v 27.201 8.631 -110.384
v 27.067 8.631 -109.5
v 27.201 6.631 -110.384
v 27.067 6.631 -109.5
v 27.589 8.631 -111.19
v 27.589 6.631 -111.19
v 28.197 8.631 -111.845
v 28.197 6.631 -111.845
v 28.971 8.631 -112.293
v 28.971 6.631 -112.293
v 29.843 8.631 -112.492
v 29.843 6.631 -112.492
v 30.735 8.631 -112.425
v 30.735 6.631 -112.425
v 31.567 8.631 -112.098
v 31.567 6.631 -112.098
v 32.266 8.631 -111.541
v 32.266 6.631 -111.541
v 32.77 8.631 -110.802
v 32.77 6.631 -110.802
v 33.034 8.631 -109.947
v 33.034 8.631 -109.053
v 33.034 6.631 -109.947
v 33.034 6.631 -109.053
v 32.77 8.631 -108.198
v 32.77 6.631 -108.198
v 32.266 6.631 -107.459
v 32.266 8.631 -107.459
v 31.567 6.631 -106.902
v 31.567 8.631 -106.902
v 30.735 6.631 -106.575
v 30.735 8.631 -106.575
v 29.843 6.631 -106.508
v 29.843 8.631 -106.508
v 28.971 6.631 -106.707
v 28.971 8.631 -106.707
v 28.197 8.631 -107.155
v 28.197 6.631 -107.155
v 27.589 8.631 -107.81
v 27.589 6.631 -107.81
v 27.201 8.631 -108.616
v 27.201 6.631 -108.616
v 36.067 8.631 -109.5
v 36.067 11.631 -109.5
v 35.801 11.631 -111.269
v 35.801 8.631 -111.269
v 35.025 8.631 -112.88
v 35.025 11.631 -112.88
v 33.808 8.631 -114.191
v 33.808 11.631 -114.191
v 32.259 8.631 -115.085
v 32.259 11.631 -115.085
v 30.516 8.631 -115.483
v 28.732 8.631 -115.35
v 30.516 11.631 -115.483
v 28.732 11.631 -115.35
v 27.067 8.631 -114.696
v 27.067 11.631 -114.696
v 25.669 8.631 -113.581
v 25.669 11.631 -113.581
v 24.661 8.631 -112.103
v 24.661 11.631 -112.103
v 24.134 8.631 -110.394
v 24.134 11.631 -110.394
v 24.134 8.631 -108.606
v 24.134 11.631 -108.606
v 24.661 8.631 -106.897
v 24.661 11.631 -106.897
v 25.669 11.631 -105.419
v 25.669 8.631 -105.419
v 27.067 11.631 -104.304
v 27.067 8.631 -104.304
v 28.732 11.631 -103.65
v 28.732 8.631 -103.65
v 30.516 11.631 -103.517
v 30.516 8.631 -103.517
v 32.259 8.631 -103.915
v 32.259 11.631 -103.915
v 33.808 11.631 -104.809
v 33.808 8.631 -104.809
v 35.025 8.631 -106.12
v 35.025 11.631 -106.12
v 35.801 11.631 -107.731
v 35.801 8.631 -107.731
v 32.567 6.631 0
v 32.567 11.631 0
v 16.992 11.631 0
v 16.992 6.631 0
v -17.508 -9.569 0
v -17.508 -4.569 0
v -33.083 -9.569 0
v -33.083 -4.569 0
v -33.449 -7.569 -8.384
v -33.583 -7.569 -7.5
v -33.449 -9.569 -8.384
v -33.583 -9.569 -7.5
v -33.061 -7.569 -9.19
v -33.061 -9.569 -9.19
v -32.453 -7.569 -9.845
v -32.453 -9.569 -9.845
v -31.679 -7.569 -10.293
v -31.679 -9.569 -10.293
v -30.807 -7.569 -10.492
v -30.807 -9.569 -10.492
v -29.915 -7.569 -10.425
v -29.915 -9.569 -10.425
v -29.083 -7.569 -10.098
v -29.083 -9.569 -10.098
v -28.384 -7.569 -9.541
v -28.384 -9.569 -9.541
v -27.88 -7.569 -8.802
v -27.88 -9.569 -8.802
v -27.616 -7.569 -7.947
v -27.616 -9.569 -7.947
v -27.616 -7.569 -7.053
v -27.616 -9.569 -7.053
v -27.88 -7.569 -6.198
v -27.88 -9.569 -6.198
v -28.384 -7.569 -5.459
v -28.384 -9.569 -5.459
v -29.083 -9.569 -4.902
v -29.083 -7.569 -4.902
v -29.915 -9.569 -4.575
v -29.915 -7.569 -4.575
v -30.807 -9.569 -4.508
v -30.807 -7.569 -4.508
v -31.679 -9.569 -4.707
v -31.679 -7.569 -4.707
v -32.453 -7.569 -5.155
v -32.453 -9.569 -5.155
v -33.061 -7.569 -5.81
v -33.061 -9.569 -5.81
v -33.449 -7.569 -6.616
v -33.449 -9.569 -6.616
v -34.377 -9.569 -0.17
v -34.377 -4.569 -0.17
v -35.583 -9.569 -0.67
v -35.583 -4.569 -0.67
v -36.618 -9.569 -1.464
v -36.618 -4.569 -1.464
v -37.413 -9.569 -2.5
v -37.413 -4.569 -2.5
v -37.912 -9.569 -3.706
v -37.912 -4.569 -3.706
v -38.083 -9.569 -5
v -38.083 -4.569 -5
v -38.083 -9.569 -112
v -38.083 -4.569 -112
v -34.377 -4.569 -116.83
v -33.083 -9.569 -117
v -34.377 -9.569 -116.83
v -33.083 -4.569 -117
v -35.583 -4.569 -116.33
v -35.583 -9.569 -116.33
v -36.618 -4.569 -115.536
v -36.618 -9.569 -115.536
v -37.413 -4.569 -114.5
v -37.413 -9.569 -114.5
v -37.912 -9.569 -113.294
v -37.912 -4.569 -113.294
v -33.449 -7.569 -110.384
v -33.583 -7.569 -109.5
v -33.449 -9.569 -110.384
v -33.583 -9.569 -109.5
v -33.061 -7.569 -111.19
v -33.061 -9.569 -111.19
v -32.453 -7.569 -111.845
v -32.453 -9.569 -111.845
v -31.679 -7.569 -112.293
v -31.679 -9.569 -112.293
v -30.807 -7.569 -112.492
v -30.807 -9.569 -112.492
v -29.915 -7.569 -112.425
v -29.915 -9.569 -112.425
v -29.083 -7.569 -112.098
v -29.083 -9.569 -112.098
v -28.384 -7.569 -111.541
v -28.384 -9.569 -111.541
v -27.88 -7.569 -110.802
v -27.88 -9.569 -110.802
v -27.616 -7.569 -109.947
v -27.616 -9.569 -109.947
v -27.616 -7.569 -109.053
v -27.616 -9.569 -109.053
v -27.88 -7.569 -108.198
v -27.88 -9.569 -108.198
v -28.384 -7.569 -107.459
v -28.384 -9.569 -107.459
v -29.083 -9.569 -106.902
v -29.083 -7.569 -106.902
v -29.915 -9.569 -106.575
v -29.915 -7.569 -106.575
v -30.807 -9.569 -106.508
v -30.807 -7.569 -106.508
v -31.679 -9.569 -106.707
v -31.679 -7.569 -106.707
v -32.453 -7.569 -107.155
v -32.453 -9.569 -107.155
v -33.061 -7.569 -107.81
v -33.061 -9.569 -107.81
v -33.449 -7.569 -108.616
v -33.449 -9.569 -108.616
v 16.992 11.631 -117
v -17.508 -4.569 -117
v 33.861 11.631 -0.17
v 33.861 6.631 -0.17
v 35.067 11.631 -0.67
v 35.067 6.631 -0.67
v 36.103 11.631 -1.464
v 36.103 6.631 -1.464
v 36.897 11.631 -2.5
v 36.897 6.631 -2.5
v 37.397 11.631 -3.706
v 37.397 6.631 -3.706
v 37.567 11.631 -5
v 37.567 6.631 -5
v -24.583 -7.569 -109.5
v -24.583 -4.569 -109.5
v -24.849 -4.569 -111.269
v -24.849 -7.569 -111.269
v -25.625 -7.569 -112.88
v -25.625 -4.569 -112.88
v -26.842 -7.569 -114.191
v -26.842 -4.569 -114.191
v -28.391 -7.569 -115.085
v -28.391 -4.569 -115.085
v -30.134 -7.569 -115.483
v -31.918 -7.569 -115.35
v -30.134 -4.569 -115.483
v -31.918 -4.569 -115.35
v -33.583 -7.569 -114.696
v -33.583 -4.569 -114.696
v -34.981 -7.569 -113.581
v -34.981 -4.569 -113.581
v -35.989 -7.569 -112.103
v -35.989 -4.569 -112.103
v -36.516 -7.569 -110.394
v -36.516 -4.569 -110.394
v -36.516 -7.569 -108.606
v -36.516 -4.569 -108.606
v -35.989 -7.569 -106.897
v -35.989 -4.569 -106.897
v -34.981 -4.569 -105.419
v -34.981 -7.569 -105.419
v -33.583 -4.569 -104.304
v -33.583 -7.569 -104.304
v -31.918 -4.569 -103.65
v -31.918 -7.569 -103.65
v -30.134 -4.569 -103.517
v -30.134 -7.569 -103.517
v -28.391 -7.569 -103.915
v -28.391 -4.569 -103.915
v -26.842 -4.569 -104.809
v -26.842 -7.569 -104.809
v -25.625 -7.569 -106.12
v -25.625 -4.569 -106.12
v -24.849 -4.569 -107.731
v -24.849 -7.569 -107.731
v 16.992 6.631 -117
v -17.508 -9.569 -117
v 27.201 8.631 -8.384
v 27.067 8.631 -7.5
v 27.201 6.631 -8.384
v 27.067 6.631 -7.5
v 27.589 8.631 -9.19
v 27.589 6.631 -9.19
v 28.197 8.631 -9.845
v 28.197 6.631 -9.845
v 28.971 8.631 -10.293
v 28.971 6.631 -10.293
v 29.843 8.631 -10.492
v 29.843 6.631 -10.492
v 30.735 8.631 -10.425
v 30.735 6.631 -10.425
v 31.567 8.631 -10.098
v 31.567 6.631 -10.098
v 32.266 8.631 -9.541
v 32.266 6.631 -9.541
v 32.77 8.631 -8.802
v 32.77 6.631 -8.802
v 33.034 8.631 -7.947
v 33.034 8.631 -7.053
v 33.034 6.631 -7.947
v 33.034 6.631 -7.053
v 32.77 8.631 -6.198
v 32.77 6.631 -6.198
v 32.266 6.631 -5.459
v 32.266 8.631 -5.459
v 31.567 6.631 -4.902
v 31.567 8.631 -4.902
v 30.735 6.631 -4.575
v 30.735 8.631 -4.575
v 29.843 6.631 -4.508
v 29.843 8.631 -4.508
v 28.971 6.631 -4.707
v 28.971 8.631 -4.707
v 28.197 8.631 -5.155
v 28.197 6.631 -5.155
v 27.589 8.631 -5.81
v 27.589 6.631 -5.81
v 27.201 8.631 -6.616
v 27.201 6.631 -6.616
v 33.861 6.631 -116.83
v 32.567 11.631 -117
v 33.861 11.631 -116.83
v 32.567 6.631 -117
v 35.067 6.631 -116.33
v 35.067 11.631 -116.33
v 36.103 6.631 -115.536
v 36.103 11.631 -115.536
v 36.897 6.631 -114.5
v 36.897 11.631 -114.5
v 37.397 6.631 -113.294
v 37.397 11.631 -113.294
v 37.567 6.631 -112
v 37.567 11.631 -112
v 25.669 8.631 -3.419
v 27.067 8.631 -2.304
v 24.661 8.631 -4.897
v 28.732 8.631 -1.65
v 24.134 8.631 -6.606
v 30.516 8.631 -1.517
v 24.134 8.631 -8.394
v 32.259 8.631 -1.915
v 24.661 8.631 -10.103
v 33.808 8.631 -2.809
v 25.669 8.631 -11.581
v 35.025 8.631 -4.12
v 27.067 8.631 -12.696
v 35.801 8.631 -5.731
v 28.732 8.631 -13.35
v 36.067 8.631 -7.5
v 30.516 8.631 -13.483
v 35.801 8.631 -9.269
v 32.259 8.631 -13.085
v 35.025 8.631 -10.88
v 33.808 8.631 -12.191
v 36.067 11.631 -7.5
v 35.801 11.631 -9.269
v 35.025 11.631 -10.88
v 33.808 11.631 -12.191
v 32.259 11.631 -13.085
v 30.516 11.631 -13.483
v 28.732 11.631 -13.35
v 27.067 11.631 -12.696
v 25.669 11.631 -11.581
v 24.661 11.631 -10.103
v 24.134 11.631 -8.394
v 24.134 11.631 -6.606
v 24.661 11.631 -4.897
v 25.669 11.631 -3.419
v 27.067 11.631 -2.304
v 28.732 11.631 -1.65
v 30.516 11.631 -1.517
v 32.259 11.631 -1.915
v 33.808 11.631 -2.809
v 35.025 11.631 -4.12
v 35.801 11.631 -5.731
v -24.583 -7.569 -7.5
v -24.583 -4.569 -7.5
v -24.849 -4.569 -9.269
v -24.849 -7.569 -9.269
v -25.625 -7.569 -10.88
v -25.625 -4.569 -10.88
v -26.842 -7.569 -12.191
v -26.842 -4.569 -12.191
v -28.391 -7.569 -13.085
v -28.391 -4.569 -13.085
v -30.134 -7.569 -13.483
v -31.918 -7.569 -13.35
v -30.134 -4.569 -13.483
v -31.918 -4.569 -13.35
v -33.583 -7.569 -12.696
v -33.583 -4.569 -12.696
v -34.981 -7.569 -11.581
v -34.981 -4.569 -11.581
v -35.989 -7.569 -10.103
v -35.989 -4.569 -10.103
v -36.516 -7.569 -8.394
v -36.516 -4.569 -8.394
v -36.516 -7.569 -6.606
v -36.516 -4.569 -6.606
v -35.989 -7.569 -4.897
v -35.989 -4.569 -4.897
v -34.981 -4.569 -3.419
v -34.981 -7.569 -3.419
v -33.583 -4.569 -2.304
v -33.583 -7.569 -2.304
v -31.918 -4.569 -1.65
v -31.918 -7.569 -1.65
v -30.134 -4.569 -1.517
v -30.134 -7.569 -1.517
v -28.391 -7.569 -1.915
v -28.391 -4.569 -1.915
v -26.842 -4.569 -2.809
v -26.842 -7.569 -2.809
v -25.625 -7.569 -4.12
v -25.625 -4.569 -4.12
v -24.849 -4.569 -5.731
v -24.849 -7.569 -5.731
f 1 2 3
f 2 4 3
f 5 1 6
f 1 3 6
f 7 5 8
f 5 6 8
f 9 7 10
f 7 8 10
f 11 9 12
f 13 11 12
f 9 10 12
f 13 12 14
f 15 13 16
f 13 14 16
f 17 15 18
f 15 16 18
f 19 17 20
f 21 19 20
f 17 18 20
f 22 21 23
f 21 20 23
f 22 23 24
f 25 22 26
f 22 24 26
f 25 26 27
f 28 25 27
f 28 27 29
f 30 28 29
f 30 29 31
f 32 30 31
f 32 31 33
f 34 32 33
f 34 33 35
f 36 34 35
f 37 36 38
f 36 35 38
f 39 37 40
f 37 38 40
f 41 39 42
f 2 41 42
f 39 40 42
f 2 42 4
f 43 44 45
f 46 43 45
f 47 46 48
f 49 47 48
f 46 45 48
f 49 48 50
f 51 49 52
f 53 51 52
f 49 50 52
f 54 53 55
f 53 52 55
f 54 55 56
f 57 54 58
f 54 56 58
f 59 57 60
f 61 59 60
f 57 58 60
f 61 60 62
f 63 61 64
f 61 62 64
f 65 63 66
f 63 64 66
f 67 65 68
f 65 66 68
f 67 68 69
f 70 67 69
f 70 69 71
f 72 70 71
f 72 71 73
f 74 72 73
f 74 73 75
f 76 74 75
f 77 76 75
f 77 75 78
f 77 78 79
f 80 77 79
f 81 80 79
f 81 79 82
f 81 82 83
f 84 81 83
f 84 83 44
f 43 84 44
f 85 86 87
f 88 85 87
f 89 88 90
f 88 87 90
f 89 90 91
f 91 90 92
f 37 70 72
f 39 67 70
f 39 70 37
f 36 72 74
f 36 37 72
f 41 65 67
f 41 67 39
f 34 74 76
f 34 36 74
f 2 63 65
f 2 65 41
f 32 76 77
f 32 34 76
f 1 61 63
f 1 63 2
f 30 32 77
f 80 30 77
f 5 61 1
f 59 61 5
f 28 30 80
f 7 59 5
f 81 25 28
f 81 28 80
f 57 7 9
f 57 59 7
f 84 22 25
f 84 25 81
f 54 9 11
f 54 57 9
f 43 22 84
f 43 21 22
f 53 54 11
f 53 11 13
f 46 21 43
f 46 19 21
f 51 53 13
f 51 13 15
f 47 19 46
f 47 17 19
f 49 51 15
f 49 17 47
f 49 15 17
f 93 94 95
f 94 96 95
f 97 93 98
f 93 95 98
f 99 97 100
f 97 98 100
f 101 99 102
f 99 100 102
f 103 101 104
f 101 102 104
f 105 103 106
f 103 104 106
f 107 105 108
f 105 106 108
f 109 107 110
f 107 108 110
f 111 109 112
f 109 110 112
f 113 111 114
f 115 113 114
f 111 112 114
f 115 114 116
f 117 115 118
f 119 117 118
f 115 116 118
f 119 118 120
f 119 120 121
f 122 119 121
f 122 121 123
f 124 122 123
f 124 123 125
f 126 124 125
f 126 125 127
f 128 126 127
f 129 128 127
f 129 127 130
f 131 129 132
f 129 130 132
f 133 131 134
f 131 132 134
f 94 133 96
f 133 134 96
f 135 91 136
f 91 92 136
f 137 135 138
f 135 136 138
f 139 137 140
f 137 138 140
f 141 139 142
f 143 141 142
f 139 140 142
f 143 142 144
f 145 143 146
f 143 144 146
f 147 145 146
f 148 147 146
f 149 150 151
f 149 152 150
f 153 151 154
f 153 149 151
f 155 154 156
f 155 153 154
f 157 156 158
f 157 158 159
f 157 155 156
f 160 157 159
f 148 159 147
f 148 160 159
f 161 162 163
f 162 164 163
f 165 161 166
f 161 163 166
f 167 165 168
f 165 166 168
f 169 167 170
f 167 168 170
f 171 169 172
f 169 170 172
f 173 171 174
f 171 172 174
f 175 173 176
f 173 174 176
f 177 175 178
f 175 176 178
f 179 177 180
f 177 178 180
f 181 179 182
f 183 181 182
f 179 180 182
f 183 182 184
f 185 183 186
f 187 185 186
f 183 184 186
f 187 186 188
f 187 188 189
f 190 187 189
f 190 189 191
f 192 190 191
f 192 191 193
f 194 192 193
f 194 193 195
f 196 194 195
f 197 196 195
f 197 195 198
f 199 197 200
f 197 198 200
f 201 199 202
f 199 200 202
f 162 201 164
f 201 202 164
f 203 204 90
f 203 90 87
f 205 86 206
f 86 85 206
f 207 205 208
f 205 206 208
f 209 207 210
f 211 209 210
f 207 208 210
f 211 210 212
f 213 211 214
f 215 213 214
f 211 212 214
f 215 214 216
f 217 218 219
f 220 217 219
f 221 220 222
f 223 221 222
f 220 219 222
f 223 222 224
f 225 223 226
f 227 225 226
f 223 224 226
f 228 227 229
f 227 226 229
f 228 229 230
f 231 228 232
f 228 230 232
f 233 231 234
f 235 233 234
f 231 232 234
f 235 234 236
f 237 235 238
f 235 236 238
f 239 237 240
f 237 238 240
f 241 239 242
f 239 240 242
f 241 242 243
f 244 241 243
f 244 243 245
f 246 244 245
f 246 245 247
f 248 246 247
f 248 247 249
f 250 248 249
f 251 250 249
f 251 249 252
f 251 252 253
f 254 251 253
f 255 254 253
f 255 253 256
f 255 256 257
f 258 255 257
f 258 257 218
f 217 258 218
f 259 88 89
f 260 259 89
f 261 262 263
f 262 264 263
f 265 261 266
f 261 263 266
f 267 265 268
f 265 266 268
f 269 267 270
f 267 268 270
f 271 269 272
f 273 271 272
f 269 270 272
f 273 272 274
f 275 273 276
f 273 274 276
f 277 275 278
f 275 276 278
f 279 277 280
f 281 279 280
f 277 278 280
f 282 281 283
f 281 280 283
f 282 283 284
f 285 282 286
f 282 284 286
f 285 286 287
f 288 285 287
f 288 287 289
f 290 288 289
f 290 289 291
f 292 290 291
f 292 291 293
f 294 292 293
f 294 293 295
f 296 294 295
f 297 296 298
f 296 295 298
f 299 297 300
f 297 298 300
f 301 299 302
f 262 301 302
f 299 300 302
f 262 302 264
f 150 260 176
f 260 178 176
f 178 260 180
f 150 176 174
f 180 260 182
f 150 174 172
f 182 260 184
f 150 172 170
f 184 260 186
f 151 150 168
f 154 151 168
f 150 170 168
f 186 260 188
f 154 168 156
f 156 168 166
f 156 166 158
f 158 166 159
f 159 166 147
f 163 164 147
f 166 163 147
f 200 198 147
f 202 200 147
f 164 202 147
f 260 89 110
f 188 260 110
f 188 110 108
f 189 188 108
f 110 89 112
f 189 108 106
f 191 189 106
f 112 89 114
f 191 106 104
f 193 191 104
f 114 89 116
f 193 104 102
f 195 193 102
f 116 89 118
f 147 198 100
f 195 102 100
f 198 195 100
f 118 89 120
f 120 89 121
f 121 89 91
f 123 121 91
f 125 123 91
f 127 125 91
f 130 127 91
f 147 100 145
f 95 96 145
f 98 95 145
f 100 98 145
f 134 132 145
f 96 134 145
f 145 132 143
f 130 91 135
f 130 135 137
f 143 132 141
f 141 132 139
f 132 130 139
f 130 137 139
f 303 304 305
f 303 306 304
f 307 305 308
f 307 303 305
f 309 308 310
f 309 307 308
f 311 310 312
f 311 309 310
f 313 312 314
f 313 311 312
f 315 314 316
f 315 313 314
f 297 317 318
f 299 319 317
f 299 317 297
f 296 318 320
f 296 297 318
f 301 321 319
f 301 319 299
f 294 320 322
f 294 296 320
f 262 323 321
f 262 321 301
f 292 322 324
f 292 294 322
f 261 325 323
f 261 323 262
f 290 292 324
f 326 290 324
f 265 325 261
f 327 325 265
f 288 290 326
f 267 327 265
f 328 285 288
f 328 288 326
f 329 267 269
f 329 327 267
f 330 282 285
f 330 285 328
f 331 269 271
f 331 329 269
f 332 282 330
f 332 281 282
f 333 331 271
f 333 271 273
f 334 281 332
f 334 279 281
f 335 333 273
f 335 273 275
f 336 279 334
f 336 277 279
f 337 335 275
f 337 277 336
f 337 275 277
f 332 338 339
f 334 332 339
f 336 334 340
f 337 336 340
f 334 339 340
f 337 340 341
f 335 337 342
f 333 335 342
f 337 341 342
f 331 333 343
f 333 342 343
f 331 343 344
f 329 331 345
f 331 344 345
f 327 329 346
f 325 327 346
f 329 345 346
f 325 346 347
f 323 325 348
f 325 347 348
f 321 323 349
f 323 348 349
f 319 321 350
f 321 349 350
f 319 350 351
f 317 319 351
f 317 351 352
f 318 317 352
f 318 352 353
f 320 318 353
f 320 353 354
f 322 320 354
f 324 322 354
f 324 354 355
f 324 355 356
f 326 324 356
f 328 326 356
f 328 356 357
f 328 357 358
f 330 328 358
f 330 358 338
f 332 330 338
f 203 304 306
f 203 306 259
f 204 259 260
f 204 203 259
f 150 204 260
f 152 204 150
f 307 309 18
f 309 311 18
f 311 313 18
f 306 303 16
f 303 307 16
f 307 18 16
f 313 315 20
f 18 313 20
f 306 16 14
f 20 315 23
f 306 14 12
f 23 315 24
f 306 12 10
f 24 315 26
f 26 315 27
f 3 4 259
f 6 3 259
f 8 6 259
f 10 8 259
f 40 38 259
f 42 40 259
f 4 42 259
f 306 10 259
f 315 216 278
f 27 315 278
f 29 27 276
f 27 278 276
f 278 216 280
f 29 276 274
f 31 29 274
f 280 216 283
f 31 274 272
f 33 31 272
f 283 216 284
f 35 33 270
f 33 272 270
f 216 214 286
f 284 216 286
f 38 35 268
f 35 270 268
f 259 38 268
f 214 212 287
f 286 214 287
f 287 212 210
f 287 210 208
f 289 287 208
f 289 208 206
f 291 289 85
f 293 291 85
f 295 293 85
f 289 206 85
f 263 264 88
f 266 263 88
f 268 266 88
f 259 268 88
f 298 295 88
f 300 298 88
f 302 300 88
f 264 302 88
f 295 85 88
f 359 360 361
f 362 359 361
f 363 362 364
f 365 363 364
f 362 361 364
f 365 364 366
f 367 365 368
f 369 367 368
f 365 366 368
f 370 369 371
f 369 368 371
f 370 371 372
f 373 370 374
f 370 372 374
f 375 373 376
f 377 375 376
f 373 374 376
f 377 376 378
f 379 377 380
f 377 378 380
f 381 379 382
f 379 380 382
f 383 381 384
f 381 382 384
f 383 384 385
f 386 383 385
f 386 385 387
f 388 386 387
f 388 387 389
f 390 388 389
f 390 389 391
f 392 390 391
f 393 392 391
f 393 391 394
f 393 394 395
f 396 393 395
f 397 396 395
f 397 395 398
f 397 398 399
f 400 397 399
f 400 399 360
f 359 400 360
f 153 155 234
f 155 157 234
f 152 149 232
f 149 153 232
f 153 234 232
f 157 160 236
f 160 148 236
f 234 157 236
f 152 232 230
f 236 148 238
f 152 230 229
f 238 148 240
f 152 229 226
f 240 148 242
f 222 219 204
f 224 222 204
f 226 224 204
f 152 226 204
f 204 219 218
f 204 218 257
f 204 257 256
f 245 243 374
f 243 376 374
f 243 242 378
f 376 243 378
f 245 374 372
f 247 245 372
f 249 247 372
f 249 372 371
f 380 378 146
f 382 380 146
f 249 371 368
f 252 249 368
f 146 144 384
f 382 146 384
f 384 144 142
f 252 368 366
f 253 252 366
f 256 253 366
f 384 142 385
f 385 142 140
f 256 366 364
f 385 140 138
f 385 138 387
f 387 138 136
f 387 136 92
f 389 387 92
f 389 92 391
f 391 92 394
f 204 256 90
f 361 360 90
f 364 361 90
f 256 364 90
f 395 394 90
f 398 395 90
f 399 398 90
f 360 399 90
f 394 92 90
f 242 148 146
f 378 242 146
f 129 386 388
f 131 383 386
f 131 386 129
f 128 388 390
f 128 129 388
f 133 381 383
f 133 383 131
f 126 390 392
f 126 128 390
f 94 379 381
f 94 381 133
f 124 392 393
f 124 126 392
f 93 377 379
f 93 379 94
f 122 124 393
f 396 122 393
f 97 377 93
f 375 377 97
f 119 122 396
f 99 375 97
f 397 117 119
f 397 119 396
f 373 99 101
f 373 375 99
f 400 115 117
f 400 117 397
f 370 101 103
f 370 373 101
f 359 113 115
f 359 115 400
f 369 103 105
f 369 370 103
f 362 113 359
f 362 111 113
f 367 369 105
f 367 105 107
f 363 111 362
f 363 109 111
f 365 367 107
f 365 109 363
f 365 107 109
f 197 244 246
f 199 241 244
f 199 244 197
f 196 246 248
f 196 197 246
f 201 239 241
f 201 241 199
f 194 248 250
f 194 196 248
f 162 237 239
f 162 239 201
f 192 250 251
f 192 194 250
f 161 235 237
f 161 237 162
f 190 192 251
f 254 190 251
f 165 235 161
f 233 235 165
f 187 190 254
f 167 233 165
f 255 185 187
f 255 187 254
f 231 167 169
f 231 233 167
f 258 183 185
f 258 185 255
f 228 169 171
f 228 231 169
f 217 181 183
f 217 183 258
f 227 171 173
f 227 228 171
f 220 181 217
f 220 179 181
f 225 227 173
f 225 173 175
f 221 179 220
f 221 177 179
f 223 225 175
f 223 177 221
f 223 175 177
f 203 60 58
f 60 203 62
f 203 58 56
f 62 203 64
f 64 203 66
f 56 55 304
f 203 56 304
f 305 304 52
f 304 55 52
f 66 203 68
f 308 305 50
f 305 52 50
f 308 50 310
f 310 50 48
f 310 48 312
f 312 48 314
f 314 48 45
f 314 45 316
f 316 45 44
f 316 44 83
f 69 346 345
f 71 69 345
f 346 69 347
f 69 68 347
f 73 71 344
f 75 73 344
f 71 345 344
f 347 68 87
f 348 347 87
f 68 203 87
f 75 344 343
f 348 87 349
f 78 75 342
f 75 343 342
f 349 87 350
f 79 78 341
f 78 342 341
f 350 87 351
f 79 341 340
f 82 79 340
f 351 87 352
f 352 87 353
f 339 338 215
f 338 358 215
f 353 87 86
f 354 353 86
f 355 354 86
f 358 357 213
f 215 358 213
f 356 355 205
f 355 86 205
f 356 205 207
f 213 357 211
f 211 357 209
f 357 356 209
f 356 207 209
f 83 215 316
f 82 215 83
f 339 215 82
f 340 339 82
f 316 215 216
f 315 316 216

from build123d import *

# Parameters (mm, degrees)
COVER_BODY_DEPTH                        = 117
CBORE_FOR_M6_HEX_HEAD_BOLT1_D           = 6
CBORE_FOR_M6_HEX_HEAD_BOLT1_CBORE_D     = 12
CBORE_FOR_M6_HEX_HEAD_BOLT1_CBORE_DEPTH = 3
CBORE_FOR_M6_HEX_HEAD_BOLT2_D           = 6
CBORE_FOR_M6_HEX_HEAD_BOLT2_CBORE_D     = 12
CBORE_FOR_M6_HEX_HEAD_BOLT2_CBORE_DEPTH = 3
FILLET1_R                               = 5


with BuildPart() as part:
    # Sketch1 → Cover Body (new body)
    with BuildSketch(Plane.XY):
        Polygon((-17.507754177, -4.568983292), (16.992245823, 11.631016708), (37.567245823, 11.631016708), (37.567245823, 6.631016708), (16.992245823, 6.631016708), (-17.507754177, -9.568983292), (-38.082754177, -9.568983292), (-38.082754177, -4.568983292), align=None)
    extrude(amount=-COVER_BODY_DEPTH)

    # CBORE for M6 Hex Head Bolt1 (through all)
    with Locations(Plane(origin=(0, -4.568983292, 0), x_dir=(1, 0, 0), z_dir=(0, 1, 0))):
        with Locations((-30.582754177, 109.5), (-30.582754177, 7.5)):
            CounterBoreHole(CBORE_FOR_M6_HEX_HEAD_BOLT1_D / 2, CBORE_FOR_M6_HEX_HEAD_BOLT1_CBORE_D / 2, CBORE_FOR_M6_HEX_HEAD_BOLT1_CBORE_DEPTH)

    # CBORE for M6 Hex Head Bolt2 (through all)
    with Locations(Plane(origin=(0, 11.631016708, 0), x_dir=(1, 0, 0), z_dir=(0, 1, 0))):
        with Locations((30.067245823, 7.5), (30.067245823, 109.5)):
            CounterBoreHole(CBORE_FOR_M6_HEX_HEAD_BOLT2_D / 2, CBORE_FOR_M6_HEX_HEAD_BOLT2_CBORE_D / 2, CBORE_FOR_M6_HEX_HEAD_BOLT2_CBORE_DEPTH)

    # Fillet1
    fillet1_edges = [part.edges().sort_by_distance(p)[0] for p in [
        (37.567245823, 9.131016708, 0),
        (37.567245823, 9.131016708, -117),
        (-38.082754177, -7.068983292, -117),
        (-38.082754177, -7.068983292, 0),
    ]]
    fillet(fillet1_edges, radius=FILLET1_R)


solid = part.part
